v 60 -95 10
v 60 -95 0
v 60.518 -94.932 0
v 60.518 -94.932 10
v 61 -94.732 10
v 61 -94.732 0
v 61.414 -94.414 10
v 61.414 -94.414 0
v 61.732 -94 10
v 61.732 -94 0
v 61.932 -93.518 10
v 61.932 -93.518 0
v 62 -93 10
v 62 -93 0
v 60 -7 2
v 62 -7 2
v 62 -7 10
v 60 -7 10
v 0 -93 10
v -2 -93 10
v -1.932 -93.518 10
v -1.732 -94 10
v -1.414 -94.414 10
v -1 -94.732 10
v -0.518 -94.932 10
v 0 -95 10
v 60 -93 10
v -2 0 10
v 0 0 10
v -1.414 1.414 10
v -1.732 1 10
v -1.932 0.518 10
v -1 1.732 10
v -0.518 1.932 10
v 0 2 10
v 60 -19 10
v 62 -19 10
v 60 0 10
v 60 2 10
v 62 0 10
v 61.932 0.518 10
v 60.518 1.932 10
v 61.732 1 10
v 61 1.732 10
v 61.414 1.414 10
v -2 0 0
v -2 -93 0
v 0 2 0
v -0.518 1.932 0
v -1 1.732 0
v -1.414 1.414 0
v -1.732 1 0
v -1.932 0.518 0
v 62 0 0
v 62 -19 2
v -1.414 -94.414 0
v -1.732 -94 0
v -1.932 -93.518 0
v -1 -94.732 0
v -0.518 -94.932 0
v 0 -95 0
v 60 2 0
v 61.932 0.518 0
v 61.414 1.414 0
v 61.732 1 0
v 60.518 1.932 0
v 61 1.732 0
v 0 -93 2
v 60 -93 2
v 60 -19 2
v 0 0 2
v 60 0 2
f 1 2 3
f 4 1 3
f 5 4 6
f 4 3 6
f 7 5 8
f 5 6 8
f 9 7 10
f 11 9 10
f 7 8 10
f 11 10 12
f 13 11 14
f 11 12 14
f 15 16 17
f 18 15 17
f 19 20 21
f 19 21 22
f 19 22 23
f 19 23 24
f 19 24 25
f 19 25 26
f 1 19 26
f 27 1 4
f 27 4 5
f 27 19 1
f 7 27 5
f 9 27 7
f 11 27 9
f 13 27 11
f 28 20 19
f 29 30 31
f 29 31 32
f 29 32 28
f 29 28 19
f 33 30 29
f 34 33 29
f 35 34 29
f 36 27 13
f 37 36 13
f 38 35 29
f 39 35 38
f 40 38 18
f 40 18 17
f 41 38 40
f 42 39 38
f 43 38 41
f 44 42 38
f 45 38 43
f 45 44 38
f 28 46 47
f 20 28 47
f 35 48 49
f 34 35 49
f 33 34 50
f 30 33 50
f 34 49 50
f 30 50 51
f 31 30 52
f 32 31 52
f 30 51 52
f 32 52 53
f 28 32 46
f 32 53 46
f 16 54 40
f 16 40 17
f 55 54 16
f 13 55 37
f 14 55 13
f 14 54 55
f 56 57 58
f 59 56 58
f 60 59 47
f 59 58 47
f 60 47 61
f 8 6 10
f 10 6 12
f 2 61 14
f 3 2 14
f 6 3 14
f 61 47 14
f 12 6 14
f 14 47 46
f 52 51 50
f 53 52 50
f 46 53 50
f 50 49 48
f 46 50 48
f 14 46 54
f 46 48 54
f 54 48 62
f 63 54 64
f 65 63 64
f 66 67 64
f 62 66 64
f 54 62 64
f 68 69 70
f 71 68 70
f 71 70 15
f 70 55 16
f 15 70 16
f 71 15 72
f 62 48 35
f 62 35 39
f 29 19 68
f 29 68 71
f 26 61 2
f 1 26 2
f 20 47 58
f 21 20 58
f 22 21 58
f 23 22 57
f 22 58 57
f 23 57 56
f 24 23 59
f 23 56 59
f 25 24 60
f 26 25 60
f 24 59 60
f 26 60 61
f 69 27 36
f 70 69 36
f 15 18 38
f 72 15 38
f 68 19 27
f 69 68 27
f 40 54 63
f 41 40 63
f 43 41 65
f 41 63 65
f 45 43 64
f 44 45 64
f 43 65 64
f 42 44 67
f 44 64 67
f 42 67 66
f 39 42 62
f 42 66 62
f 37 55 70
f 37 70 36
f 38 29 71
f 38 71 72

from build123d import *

# Parameters (mm, degrees)
PAD_DEPTH       = 10
SKETCH_W        = 60
SKETCH_H        = 93
POCKET_DEPTH    = 8
SKETCH005_W     = 12
SKETCH005_H     = 8
POCKET003_DEPTH = 2


with BuildPart() as part:
    # Sketch001 → Pad (new body)
    with BuildSketch(Plane.XY):
        with BuildLine():
            ThreePointArc((0, 2), (-1.414214, 1.414214), (-2, 0))
            Line((-2, 0), (-2, -93))
            ThreePointArc((-2, -93), (-1.414207, -94.414201), (0, -94.999981))
            Line((0, -94.999981), (60, -94.999981))
            ThreePointArc((60, -94.999981), (61.414214, -94.414194), (62, -92.99998))
            Line((62, 0), (62, -92.99998))
            ThreePointArc((62, 0), (61.414214, 1.414214), (60, 2))
            Line((0, 2), (60, 2))
        make_face()
    extrude(amount=PAD_DEPTH)

    # Sketch (on Face10 of Pad) → Pocket (cut)
    with BuildSketch(Plane.XY.offset(10)):
        with Locations((30, -46.5)):
            Rectangle(SKETCH_W, SKETCH_H)
    extrude(amount=-POCKET_DEPTH, mode=Mode.SUBTRACT)

    # Sketch005 (on Face2 of Pocket) → Pocket003 (cut)
    with BuildSketch(Plane.YZ.offset(62)):
        with Locations((-13, 6)):
            Rectangle(SKETCH005_W, SKETCH005_H)
    extrude(amount=-POCKET003_DEPTH, mode=Mode.SUBTRACT)


solid = part.part
